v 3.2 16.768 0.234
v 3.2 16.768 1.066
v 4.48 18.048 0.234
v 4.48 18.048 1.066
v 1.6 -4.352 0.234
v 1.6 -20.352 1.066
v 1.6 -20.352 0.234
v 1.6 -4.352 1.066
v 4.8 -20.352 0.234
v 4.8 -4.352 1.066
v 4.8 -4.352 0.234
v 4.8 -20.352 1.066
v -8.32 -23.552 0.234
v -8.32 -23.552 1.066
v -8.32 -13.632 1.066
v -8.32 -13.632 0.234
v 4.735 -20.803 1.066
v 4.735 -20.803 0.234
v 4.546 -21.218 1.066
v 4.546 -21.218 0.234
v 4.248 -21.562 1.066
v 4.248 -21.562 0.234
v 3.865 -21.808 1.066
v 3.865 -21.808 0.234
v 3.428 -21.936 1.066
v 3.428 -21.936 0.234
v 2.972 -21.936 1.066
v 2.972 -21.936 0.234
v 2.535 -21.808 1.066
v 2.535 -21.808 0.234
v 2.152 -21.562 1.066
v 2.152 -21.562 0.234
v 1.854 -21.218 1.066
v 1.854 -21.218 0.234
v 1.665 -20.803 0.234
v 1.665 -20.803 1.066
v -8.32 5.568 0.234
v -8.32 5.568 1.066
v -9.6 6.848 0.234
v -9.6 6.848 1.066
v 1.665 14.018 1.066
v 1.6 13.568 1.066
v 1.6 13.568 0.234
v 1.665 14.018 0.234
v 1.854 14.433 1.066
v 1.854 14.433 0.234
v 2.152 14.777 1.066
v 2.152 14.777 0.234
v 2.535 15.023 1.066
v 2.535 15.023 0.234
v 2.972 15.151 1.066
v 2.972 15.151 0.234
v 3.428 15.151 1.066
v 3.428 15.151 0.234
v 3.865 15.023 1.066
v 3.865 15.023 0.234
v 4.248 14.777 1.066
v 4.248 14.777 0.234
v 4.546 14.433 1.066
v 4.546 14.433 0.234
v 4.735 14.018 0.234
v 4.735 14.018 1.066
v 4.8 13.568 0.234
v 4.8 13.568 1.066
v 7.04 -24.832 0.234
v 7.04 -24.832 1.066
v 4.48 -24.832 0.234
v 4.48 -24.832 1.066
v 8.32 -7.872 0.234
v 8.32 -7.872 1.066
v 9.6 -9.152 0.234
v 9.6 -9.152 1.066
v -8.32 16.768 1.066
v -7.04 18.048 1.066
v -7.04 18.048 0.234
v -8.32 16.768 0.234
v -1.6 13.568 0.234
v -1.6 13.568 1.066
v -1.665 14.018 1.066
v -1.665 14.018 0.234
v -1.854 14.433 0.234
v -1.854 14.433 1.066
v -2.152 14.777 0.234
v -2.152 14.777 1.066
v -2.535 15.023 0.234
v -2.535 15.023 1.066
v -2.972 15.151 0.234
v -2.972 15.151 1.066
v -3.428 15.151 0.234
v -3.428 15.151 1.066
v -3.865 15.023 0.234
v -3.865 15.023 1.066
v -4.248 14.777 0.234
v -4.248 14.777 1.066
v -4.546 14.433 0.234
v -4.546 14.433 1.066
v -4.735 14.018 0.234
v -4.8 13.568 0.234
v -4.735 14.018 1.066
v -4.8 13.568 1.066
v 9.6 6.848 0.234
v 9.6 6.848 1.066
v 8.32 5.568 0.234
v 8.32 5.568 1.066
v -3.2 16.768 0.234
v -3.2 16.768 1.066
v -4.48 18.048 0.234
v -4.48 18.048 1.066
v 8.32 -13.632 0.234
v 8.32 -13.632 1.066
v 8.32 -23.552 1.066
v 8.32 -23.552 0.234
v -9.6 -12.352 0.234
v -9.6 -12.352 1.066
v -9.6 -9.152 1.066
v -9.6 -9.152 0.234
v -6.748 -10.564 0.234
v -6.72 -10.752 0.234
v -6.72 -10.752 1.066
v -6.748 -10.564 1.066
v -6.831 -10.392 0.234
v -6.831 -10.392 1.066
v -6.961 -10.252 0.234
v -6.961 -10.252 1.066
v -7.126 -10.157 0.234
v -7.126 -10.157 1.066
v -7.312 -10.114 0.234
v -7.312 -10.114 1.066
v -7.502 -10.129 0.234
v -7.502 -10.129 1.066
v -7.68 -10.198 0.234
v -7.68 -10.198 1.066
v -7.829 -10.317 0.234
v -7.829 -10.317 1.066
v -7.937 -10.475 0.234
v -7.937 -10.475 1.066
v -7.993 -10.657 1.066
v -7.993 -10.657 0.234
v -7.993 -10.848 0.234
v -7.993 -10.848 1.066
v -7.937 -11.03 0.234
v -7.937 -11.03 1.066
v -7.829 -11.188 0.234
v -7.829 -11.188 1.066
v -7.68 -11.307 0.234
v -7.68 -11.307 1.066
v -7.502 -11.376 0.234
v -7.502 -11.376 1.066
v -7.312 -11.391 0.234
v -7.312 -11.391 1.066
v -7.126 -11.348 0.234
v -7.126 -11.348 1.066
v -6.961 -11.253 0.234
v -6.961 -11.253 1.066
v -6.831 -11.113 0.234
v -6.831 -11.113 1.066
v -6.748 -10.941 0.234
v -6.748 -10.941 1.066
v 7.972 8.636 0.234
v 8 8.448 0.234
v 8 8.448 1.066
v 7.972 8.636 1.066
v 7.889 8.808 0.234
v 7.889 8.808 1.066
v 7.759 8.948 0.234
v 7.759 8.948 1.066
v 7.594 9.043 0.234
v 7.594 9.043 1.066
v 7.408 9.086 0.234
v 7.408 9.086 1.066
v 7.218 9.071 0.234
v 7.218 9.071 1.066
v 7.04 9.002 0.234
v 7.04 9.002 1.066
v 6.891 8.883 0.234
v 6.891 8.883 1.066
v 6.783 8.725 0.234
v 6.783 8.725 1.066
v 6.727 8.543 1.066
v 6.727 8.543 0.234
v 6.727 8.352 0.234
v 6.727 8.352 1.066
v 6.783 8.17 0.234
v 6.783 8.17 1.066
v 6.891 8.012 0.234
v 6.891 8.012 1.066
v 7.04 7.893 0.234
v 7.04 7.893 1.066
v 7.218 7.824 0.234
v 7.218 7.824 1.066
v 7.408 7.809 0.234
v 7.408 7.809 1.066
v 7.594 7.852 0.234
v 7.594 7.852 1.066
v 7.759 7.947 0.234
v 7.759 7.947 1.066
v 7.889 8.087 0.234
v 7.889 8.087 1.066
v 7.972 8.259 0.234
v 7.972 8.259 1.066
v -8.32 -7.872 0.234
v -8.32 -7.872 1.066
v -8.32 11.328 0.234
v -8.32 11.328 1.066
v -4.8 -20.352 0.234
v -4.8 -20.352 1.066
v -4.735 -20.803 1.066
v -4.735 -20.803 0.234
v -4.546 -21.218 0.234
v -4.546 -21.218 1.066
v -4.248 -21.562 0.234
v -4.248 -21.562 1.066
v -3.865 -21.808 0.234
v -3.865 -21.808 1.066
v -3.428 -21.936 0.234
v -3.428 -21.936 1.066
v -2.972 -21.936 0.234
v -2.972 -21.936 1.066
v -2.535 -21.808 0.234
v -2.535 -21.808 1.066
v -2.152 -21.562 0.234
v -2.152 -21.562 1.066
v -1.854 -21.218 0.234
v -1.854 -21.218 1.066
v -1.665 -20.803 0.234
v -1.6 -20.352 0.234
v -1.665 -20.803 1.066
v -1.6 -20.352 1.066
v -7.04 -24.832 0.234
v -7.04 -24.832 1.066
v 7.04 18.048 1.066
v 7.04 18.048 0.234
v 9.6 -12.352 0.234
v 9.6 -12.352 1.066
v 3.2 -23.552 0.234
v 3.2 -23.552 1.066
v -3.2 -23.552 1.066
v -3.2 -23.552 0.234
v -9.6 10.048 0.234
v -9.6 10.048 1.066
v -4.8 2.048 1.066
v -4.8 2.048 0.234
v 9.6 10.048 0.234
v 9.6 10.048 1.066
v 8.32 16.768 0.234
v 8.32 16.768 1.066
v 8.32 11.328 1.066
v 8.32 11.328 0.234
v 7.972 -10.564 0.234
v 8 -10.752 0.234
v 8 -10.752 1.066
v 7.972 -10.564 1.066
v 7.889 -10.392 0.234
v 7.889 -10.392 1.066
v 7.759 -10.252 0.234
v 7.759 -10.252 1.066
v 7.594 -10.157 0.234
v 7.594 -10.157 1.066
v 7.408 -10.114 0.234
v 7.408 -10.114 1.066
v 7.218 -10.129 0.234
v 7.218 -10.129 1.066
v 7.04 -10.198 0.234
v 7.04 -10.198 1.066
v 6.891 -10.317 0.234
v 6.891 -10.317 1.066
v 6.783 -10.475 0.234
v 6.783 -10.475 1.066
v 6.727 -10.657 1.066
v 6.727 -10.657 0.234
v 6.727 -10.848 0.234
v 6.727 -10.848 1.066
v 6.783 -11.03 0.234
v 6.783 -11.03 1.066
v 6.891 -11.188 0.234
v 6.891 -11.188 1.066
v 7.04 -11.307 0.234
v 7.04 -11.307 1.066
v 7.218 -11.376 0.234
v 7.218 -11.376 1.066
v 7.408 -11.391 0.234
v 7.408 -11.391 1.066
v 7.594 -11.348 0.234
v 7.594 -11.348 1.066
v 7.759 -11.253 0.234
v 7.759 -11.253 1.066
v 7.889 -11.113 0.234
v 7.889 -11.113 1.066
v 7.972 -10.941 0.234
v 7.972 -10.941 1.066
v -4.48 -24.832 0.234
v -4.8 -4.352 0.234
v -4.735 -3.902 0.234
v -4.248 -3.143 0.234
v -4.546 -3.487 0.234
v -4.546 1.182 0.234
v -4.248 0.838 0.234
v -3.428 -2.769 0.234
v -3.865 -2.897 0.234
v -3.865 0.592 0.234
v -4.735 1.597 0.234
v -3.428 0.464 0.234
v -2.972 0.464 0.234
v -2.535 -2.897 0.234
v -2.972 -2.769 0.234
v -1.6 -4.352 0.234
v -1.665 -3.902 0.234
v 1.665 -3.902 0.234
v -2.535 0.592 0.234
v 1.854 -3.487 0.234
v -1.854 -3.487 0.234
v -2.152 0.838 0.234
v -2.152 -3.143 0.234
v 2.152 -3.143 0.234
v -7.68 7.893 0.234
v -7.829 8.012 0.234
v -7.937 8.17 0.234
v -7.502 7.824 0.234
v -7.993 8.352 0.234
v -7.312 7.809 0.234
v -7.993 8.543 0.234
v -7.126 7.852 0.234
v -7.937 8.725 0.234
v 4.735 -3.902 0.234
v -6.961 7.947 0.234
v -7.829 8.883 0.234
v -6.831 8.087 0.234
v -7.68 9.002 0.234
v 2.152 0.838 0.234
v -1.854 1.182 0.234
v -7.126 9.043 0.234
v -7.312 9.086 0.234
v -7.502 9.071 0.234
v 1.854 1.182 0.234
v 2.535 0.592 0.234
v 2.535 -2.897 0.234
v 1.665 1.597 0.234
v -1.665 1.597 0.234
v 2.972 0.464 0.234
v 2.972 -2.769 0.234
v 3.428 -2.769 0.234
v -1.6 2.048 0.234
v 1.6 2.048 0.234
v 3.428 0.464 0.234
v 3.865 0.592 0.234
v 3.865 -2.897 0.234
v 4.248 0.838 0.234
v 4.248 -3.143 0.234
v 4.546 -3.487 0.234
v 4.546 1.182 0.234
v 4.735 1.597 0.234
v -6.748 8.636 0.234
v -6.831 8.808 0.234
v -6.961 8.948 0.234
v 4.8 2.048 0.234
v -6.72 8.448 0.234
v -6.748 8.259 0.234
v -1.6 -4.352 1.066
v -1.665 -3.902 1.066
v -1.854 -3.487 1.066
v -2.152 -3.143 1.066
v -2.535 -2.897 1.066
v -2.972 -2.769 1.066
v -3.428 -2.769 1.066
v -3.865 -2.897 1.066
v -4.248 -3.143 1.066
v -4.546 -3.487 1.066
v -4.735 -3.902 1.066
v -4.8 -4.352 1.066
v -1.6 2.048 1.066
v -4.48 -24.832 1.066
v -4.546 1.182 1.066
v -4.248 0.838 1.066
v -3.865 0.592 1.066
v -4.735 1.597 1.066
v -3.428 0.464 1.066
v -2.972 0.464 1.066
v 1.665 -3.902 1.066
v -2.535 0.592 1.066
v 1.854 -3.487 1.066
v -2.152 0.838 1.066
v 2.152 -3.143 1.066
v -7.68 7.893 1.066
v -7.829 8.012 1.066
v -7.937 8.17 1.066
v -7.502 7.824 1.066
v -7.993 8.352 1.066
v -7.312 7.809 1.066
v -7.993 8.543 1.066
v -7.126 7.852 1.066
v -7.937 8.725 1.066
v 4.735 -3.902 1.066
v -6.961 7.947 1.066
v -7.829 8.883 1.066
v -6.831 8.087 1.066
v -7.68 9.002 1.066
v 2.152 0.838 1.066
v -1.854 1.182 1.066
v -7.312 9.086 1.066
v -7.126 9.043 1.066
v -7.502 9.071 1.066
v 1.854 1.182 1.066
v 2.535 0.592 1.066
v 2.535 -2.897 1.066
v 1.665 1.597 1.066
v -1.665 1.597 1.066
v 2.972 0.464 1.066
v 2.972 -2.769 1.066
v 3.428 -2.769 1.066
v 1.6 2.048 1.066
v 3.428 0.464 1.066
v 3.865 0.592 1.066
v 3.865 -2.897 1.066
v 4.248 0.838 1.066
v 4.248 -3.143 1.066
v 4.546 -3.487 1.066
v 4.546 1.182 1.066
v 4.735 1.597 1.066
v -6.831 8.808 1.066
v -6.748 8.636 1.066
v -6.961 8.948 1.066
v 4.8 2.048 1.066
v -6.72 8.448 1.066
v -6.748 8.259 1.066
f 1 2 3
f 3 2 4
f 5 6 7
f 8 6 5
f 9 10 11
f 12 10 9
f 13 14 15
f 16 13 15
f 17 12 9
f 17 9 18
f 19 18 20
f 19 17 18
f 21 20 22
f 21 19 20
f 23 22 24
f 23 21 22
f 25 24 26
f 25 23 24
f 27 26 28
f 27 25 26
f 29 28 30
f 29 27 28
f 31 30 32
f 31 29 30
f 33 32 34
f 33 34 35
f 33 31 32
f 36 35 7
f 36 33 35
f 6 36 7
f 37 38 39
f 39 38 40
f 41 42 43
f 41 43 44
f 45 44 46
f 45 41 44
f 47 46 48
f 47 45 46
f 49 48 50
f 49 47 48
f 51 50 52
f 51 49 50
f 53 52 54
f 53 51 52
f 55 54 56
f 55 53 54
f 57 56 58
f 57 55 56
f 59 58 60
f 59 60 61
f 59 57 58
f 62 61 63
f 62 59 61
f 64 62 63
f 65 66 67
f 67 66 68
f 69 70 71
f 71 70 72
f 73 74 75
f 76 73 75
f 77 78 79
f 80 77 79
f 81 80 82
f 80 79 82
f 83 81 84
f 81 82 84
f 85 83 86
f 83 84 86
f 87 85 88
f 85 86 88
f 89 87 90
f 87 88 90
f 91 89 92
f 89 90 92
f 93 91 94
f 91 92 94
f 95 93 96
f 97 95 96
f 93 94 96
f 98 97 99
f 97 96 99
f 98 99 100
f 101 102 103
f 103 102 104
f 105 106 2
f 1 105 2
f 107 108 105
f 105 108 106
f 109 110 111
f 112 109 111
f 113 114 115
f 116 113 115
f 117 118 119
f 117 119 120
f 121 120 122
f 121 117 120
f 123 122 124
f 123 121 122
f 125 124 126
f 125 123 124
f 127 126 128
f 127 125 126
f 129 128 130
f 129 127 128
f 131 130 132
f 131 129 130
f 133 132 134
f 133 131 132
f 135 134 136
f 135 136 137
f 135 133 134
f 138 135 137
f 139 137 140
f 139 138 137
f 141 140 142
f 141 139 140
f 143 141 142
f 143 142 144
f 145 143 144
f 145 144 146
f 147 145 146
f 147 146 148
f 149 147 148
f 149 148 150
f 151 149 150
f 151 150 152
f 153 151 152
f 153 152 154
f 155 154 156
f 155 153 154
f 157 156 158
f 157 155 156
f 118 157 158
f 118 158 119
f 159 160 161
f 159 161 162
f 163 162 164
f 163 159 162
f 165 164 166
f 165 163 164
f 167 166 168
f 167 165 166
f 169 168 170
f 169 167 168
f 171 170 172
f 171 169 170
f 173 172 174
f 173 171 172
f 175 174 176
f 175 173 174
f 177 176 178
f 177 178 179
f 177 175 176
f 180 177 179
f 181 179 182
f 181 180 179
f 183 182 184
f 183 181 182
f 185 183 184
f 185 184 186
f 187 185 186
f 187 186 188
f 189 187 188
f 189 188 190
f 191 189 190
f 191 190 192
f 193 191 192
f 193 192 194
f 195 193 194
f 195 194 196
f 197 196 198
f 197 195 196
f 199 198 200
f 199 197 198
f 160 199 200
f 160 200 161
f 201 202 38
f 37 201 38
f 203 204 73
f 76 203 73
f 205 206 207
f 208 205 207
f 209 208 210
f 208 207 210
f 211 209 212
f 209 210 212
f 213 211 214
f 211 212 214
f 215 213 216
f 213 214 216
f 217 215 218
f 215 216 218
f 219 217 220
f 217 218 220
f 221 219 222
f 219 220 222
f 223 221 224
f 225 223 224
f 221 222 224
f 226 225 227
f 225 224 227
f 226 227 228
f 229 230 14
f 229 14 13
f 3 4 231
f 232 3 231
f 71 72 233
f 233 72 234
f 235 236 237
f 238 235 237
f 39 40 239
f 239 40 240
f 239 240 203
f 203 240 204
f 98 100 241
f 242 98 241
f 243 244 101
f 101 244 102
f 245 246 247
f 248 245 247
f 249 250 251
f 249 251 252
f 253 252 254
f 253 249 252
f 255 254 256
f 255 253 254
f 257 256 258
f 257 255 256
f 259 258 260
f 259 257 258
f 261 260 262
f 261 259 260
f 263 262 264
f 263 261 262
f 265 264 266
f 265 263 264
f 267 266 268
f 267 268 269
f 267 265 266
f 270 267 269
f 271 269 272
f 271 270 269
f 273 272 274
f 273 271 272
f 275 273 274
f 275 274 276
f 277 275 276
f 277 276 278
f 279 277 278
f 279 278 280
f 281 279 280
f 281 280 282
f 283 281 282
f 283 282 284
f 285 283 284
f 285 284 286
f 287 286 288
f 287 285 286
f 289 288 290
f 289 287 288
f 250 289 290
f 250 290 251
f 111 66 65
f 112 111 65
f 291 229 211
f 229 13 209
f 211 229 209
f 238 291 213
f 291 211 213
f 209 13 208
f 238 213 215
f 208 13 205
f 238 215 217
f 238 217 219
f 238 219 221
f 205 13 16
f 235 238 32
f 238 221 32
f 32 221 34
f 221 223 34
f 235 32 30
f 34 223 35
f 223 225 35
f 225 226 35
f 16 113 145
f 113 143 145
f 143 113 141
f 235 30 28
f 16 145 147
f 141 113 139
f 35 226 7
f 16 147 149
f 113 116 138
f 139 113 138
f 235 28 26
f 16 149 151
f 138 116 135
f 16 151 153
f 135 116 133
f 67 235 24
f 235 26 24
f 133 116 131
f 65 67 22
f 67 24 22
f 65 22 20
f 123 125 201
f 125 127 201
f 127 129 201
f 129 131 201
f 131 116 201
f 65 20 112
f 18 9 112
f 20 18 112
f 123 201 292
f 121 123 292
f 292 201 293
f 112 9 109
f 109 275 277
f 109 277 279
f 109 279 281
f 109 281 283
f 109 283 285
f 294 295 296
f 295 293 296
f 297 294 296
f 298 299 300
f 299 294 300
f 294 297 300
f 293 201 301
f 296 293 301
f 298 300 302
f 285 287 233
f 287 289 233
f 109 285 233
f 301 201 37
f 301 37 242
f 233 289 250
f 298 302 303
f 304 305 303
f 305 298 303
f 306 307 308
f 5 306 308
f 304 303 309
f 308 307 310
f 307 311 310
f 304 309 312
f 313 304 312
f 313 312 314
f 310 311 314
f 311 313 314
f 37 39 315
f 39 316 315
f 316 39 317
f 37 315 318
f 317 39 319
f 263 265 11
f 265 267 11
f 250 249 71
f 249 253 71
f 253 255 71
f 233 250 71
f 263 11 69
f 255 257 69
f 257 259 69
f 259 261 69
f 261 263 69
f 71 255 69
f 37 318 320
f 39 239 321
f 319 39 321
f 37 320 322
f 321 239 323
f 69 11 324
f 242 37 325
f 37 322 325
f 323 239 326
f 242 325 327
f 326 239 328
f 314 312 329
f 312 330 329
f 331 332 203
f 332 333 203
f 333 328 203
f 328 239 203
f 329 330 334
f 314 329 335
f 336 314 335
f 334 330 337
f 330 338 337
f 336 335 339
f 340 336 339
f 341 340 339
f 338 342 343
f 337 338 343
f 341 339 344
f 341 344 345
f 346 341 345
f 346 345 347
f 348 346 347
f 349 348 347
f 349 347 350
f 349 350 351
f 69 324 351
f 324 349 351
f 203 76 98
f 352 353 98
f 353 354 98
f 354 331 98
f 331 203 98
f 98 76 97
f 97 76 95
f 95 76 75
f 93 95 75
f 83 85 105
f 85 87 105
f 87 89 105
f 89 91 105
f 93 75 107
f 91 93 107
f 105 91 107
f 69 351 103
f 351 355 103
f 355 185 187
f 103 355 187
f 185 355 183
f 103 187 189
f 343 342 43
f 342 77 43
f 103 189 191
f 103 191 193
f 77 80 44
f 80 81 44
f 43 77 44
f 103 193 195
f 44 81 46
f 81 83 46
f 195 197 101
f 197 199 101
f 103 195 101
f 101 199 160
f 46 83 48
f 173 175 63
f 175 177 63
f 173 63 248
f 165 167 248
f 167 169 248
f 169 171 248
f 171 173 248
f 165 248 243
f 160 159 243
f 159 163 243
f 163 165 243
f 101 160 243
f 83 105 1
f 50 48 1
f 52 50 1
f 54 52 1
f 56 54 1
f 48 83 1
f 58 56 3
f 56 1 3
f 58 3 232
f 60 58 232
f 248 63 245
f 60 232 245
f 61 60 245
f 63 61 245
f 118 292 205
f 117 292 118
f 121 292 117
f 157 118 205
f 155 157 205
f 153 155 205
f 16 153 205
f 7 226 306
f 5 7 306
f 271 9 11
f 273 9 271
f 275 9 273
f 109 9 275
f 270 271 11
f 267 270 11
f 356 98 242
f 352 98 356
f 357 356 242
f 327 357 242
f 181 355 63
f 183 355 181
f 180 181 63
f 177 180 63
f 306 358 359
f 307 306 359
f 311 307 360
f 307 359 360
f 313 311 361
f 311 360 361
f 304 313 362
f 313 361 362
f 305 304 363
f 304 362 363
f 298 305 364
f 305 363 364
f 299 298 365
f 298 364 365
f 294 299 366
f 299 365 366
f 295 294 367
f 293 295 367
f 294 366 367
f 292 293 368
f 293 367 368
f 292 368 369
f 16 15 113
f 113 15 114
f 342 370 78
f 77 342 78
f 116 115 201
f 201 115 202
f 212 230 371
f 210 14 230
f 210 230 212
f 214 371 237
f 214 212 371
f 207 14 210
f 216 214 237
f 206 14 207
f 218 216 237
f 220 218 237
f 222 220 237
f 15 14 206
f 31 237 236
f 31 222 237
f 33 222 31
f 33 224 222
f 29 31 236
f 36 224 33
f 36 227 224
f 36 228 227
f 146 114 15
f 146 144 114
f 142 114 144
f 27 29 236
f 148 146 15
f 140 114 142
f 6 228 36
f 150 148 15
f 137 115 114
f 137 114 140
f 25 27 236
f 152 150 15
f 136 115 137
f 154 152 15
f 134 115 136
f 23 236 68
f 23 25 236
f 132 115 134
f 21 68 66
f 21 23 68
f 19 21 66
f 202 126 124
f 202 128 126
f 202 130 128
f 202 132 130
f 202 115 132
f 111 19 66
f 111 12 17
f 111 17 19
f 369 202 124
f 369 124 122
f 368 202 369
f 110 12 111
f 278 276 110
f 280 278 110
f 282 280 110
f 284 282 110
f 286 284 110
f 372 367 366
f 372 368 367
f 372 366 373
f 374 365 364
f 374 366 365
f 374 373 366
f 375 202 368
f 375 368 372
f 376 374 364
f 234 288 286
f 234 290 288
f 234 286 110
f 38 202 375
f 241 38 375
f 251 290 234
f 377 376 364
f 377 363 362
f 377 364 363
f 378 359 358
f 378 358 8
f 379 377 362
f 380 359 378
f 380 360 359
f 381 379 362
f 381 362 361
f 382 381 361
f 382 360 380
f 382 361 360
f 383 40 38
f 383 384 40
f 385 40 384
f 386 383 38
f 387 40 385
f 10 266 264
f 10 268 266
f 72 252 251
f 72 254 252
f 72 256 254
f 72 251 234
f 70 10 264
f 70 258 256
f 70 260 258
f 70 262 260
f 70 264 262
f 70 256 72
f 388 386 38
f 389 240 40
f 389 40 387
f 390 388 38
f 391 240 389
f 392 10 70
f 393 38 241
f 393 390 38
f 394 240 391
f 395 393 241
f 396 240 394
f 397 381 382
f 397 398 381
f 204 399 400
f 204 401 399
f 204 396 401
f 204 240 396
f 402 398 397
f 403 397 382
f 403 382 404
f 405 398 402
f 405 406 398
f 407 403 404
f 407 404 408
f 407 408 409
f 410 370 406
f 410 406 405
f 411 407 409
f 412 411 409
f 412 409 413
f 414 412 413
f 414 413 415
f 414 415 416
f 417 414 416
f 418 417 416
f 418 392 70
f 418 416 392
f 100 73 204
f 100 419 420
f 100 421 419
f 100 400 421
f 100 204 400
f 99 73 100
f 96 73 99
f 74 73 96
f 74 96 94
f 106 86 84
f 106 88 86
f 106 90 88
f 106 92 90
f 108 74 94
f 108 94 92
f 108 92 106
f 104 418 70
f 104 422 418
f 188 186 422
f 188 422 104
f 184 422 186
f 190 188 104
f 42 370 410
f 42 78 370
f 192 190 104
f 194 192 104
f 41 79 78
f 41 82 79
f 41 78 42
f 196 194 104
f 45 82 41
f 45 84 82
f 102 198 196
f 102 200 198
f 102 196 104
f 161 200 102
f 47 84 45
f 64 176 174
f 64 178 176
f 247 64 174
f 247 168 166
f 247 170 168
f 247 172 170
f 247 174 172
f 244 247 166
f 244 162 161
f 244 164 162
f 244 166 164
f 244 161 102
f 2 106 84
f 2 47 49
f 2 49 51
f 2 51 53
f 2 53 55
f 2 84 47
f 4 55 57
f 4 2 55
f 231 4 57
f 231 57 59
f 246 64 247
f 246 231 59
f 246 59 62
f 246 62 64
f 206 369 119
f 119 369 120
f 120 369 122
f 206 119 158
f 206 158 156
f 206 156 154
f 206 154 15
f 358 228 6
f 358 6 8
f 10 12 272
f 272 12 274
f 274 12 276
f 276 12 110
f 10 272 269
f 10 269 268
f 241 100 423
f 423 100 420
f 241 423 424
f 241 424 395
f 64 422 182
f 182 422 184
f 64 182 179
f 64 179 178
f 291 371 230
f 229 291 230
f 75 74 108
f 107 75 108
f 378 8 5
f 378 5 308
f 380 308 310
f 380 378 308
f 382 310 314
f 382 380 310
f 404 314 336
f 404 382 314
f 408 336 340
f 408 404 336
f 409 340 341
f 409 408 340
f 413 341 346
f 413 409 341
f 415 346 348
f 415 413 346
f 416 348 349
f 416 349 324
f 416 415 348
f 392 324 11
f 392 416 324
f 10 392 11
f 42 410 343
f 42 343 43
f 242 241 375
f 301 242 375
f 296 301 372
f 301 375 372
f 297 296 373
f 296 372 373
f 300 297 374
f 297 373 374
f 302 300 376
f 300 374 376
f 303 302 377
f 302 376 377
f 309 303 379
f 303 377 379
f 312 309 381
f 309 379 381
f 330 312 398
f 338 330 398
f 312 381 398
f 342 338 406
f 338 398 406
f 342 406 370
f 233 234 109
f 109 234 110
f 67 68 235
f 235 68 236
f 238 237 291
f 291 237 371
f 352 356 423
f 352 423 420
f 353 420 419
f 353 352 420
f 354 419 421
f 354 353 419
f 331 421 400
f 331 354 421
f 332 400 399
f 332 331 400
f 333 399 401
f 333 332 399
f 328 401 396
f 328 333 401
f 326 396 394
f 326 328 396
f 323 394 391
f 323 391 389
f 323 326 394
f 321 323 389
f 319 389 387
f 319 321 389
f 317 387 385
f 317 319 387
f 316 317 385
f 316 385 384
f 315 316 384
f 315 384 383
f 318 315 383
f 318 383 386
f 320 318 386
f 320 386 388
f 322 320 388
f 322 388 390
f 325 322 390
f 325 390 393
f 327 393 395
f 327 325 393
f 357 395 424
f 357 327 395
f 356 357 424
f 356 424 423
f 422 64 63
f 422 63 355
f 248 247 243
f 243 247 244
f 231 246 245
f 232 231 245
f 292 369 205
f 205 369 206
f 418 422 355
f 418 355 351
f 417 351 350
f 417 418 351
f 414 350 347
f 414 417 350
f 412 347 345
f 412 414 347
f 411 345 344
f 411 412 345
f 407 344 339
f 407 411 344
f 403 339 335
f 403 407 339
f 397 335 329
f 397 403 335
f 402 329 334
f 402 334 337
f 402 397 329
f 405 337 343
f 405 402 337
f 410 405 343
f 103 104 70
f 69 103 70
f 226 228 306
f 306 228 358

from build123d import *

# Parameters (mm, degrees)
SKICA1_W                 = 30
SKICA1_H                 = 67
SKICA1_R                 = 1
P_IDAT_VYSUNUT_M1_DEPTH  = 1.3
ODEBRAT_VYSUNUT_M1_DEPTH = 1.3
ZKOSEN_1_SIZE            = 2
SCALA1_SCALE             = 0.64


with BuildPart() as part:
    # Skica1 → Přidat vysunutím1 (new body)
    with BuildSketch(Plane.XY):
        with Locations((0, -3.5)):
            Rectangle(SKICA1_W, SKICA1_H)
        with Locations((-11.5, 15)):
            Circle(SKICA1_R, mode=Mode.SUBTRACT)
        with Locations((-11.5, -15)):
            Circle(SKICA1_R, mode=Mode.SUBTRACT)
        with Locations((11.5, -15)):
            Circle(SKICA1_R, mode=Mode.SUBTRACT)
        with Locations((11.5, 15)):
            Circle(SKICA1_R, mode=Mode.SUBTRACT)
    extrude(amount=P_IDAT_VYSUNUT_M1_DEPTH)

    # Skica2 → Odebrat vysunutím1 (cut)
    with BuildSketch(Plane.XY.offset(1.3)):
        Polygon((-15, 12.5), (-15, 17.5), (-15, 30), (-13, 30), (-7, 30), (0, 30), (0, 36.174813822), (-21.495608396, 36.174813822), (-21.495608396, -40.537143206), (0, -40.537143206), (0, -37), (-7, -37), (-13, -37), (-15, -37), (-15, -17.5), (-15, -12.5), align=None)
        Polygon((0, 36.174813822), (0, 30), (7, 30), (13, 30), (15, 30), (15, 17.5), (15, 12.5), (15, -12.5), (15, -17.5), (15, -37), (13, -37), (7, -37), (0, -37), (0, -40.537143206), (21.495608396, -40.537143206), (21.495608396, 36.174813822), align=None)
        Polygon((15, 30), (13, 30), (13, 19.5), (15, 17.5), align=None)
        Polygon((15, -12.5), (15, 12.5), (13, 10.5), (13, -10.5), align=None)
        Polygon((13, -19.5), (13, -37), (15, -37), (15, -17.5), align=None)
        Polygon((0, -35), (0, -37), (7, -37), (5, -35), align=None)
        Polygon((-5, -35), (-7, -37), (0, -37), (0, -35), align=None)
        Polygon((-13, -19.5), (-15, -17.5), (-15, -37), (-13, -37), align=None)
        Polygon((-13, 10.5), (-15, 12.5), (-15, -12.5), (-13, -10.5), align=None)
        Polygon((-15, 30), (-15, 17.5), (-13, 19.5), (-13, 30), align=None)
        Polygon((7, 30), (0, 30), (0, 28), (5, 28), align=None)
        Polygon((0, 30), (-7, 30), (-5, 28), (0, 28), align=None)
        with BuildLine():
            Line((-7.5, 23), (-7.5, 5))
            ThreePointArc((-7.5, 5), (-5, 2.5), (-2.5, 5))
            Line((-2.5, 5), (-2.5, 23))
            ThreePointArc((-2.5, 23), (-5, 25.5), (-7.5, 23))
        make_face()
        with BuildLine():
            ThreePointArc((7.5, 5), (5, 2.5), (2.5, 5))
            Line((2.5, 5), (2.5, 23))
            ThreePointArc((2.5, 23), (5, 25.5), (7.5, 23))
            Line((7.5, 23), (7.5, 5))
        make_face()
        with BuildLine():
            ThreePointArc((7.5, -30), (5, -32.5), (2.5, -30))
            Line((2.5, -30), (2.5, -5))
            ThreePointArc((2.5, -5), (5, -2.5), (7.5, -5))
            Line((7.5, -5), (7.5, -30))
        make_face()
        with BuildLine():
            Line((-7.5, -5), (-7.5, -30))
            ThreePointArc((-7.5, -30), (-5, -32.5), (-2.5, -30))
            Line((-2.5, -30), (-2.5, -5))
            ThreePointArc((-2.5, -5), (-5, -2.5), (-7.5, -5))
        make_face()
    extrude(amount=-ODEBRAT_VYSUNUT_M1_DEPTH, mode=Mode.SUBTRACT)

    # Zkosení1
    zkosen_1_edges = [part.edges().sort_by_distance(p)[0] for p in [
        (13, 30, 0.65),
        (-13, 30, 0.65),
        (-13, -37, 0.65),
        (13, -37, 0.65),
    ]]
    chamfer(zkosen_1_edges, length=ZKOSEN_1_SIZE)


with BuildPart() as part_1:
    # Scala1: scaled about (0, -3.201388425, 0.65)
    add(part.part.scale(SCALA1_SCALE).moved(Location((0, -1.152499833, 0.234))))


solid = part_1.part
